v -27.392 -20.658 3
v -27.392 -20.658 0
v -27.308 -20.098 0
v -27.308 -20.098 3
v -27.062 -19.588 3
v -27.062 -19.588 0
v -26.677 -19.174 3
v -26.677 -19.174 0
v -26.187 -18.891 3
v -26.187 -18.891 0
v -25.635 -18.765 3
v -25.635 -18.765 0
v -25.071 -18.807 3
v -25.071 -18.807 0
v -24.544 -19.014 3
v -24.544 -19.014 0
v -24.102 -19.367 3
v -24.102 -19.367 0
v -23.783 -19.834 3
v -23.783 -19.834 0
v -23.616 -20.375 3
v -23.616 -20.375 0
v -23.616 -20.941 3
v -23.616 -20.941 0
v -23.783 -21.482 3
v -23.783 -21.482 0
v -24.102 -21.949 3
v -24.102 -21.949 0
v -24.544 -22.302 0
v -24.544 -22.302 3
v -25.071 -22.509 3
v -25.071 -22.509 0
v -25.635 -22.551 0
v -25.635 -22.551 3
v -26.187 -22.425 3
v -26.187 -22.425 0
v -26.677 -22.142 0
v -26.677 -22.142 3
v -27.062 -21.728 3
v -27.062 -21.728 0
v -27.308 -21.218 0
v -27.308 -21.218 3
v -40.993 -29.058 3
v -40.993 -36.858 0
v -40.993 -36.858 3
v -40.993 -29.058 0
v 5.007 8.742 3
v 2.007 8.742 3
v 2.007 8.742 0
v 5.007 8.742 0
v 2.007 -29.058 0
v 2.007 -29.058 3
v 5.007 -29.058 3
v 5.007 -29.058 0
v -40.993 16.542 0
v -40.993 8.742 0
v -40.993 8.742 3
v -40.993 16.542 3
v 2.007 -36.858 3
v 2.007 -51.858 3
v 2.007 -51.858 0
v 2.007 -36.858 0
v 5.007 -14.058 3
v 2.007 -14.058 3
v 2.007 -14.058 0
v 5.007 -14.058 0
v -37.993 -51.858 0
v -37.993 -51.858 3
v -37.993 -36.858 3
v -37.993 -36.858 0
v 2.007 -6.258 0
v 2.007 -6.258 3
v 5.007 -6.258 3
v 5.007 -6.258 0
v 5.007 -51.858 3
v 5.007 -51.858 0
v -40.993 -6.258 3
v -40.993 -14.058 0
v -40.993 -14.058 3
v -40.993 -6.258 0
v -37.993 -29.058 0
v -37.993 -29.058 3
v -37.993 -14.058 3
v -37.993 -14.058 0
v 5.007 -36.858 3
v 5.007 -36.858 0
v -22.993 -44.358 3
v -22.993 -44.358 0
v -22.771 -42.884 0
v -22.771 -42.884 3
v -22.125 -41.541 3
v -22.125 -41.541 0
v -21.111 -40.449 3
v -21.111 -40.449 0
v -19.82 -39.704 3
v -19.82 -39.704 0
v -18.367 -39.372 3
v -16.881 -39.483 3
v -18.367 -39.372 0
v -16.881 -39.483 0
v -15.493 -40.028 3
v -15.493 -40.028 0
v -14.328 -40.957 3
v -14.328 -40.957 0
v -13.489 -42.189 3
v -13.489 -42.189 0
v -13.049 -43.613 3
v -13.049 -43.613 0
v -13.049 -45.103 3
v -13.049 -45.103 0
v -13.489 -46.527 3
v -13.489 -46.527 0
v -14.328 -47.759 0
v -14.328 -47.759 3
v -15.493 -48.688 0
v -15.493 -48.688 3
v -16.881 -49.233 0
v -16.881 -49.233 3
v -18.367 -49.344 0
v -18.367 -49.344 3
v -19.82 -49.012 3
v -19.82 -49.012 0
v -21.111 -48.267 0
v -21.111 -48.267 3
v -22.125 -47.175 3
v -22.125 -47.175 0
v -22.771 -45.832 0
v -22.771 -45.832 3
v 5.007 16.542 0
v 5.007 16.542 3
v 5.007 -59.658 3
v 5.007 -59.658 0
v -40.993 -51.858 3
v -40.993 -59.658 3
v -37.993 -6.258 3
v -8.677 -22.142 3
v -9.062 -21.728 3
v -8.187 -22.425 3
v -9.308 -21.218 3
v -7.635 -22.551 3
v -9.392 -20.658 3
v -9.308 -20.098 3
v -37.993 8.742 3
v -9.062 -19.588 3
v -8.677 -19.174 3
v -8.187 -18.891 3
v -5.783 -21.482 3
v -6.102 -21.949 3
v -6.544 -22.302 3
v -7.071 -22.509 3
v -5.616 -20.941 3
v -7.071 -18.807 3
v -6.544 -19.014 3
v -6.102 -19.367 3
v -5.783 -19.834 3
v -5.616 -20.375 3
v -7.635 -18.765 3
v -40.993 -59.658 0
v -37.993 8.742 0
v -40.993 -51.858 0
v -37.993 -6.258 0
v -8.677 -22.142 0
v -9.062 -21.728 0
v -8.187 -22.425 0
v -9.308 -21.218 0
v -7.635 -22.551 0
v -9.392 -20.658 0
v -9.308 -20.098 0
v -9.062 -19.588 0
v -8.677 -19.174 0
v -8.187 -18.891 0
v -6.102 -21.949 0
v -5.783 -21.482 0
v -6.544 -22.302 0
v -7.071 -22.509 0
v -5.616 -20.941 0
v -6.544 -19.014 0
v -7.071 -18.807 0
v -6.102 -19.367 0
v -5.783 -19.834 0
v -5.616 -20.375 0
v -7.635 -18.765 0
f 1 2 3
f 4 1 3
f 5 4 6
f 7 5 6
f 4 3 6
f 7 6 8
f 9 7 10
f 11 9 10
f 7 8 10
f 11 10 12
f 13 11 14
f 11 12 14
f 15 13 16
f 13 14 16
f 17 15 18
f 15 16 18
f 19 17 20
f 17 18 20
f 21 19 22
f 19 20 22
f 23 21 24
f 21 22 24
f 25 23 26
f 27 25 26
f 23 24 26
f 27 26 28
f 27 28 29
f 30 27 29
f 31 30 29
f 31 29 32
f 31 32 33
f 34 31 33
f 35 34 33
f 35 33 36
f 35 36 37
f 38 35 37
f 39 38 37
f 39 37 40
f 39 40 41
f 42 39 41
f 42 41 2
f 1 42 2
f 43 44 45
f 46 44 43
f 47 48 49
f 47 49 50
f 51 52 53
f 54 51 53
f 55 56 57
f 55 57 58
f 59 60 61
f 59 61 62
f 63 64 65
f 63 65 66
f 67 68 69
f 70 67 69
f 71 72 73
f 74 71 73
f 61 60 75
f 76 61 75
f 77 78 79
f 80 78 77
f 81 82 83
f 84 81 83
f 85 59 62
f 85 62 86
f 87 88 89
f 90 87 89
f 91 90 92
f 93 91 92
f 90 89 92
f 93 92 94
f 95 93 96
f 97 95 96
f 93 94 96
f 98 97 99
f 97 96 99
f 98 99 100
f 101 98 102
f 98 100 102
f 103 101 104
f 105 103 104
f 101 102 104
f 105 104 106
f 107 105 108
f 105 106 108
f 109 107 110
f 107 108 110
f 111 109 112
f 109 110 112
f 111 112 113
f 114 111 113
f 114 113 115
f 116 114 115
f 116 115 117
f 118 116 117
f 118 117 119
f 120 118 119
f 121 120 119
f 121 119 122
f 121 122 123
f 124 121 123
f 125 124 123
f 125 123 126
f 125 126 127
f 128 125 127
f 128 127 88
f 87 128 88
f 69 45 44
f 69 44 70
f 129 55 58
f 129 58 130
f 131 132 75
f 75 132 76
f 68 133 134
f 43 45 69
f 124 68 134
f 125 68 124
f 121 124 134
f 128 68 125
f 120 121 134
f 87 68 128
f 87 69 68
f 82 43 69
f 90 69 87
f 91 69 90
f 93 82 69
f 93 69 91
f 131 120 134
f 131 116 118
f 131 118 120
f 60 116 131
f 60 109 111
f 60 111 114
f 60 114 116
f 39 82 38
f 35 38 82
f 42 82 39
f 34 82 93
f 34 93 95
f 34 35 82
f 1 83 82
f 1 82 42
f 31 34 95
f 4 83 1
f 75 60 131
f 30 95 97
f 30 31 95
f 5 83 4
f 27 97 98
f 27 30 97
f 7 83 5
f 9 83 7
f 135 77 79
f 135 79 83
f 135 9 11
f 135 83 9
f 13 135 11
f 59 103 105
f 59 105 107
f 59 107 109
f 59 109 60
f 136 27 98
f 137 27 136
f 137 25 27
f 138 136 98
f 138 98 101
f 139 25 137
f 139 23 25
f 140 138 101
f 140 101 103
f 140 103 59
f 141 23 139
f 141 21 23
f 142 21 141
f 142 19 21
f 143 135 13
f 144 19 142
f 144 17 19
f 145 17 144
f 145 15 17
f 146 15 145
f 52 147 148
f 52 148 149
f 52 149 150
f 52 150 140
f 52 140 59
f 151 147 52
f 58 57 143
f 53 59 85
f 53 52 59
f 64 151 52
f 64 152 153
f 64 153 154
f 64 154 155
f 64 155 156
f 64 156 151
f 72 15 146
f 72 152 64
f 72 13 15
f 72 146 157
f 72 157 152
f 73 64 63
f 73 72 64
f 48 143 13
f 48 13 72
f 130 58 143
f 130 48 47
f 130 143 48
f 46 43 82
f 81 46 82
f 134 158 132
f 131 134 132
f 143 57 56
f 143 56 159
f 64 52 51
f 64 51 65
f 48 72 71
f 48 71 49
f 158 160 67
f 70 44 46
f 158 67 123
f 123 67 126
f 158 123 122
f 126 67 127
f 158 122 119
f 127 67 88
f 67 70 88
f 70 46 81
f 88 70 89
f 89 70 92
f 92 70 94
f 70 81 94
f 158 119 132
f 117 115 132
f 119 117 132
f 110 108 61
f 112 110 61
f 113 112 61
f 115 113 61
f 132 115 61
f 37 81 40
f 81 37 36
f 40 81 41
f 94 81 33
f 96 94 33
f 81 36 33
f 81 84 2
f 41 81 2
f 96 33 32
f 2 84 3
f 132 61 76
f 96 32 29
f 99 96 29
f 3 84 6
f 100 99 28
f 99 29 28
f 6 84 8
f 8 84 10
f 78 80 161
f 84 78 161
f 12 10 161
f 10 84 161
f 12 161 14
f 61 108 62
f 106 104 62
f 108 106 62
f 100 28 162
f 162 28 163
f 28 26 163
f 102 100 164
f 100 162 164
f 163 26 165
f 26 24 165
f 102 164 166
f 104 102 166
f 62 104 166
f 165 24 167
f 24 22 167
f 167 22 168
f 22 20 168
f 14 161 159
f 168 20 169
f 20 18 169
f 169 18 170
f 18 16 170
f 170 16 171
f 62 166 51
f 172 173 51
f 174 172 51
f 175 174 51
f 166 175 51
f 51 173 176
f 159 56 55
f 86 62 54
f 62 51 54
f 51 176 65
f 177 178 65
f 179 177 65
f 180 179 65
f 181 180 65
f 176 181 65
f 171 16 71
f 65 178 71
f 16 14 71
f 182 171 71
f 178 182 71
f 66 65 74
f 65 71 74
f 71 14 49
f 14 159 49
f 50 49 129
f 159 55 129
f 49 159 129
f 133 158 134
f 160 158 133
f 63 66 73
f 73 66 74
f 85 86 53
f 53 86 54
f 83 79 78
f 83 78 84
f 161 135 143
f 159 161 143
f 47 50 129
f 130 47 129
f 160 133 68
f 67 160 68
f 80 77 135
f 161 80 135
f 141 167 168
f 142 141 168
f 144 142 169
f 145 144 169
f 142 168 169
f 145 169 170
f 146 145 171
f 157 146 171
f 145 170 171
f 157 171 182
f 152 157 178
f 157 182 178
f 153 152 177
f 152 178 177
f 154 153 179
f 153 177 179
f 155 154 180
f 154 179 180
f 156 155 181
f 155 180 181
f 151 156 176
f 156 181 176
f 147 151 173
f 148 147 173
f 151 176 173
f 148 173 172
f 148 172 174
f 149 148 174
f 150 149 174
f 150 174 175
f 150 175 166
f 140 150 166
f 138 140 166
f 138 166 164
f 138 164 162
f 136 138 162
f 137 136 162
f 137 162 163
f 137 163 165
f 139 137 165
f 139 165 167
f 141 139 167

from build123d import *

# Parameters (mm, degrees)
SKETCH1_W             = 46
SKETCH1_H             = 76.2
BOSS_EXTRUDE1_DEPTH   = 3
SKETCH2_W             = 3
SKETCH2_H             = 15
CUT_EXTRUDE1_DEPTH    = 73.446802019
LPATTERN1_COUNT       = 3
LPATTERN1_PITCH       = 22.8
F_6_CLEARANCE_HOLE1_D = 3.7973
CUT_EXTRUDE2_REACH    = 74.447
SKETCH5_R             = 5


with BuildPart() as part:
    # Sketch1 → Boss-Extrude1 (new body)
    with BuildSketch(Plane.XY):
        with Locations((-17.993460648, -21.557986111)):
            Rectangle(SKETCH1_W, SKETCH1_H)
    extrude(amount=BOSS_EXTRUDE1_DEPTH)

    # Sketch2 → Cut-Extrude1 (cut, through all)
    with BuildSketch(Plane.XY.offset(3)):
        with Locations((-39.493460648, 1.242013889)):
            Rectangle(SKETCH2_W, SKETCH2_H)
        with Locations((3.506539352, 1.242013889)):
            Rectangle(SKETCH2_W, SKETCH2_H)
    cut_extrude1 = extrude(amount=-CUT_EXTRUDE1_DEPTH, mode=Mode.SUBTRACT)

    # LPattern1: Cut-Extrude1 ×3
    with Locations(*[(0, -i * LPATTERN1_PITCH, 0) for i in range(1, LPATTERN1_COUNT)]):
        add(cut_extrude1, mode=Mode.SUBTRACT)

    # #6 Clearance Hole1 (through all)
    with Locations(Plane.XY.offset(3)):
        with Locations((-25.493460648, -20.657986111), (-7.493460648, -20.657986111)):
            Hole(F_6_CLEARANCE_HOLE1_D / 2)

    # Sketch5 → Cut-Extrude2 (cut, up to next)
    with BuildSketch(Plane(origin=(0, 0, 0), x_dir=(-1, 0, 0), z_dir=(0, 0, -1)), mode=Mode.PRIVATE) as cut_extrude2_sk1:
        with Locations((17.993460648, -44.357986111)):
            Circle(SKETCH5_R)
    cut_extrude2_tool1 = extrude(cut_extrude2_sk1.sketch, amount=-CUT_EXTRUDE2_REACH, mode=Mode.PRIVATE) & part.part
    add(cut_extrude2_tool1.solids().sort_by_distance((-17.993461, -44.357986, 0))[0], mode=Mode.SUBTRACT)


solid = part.part
